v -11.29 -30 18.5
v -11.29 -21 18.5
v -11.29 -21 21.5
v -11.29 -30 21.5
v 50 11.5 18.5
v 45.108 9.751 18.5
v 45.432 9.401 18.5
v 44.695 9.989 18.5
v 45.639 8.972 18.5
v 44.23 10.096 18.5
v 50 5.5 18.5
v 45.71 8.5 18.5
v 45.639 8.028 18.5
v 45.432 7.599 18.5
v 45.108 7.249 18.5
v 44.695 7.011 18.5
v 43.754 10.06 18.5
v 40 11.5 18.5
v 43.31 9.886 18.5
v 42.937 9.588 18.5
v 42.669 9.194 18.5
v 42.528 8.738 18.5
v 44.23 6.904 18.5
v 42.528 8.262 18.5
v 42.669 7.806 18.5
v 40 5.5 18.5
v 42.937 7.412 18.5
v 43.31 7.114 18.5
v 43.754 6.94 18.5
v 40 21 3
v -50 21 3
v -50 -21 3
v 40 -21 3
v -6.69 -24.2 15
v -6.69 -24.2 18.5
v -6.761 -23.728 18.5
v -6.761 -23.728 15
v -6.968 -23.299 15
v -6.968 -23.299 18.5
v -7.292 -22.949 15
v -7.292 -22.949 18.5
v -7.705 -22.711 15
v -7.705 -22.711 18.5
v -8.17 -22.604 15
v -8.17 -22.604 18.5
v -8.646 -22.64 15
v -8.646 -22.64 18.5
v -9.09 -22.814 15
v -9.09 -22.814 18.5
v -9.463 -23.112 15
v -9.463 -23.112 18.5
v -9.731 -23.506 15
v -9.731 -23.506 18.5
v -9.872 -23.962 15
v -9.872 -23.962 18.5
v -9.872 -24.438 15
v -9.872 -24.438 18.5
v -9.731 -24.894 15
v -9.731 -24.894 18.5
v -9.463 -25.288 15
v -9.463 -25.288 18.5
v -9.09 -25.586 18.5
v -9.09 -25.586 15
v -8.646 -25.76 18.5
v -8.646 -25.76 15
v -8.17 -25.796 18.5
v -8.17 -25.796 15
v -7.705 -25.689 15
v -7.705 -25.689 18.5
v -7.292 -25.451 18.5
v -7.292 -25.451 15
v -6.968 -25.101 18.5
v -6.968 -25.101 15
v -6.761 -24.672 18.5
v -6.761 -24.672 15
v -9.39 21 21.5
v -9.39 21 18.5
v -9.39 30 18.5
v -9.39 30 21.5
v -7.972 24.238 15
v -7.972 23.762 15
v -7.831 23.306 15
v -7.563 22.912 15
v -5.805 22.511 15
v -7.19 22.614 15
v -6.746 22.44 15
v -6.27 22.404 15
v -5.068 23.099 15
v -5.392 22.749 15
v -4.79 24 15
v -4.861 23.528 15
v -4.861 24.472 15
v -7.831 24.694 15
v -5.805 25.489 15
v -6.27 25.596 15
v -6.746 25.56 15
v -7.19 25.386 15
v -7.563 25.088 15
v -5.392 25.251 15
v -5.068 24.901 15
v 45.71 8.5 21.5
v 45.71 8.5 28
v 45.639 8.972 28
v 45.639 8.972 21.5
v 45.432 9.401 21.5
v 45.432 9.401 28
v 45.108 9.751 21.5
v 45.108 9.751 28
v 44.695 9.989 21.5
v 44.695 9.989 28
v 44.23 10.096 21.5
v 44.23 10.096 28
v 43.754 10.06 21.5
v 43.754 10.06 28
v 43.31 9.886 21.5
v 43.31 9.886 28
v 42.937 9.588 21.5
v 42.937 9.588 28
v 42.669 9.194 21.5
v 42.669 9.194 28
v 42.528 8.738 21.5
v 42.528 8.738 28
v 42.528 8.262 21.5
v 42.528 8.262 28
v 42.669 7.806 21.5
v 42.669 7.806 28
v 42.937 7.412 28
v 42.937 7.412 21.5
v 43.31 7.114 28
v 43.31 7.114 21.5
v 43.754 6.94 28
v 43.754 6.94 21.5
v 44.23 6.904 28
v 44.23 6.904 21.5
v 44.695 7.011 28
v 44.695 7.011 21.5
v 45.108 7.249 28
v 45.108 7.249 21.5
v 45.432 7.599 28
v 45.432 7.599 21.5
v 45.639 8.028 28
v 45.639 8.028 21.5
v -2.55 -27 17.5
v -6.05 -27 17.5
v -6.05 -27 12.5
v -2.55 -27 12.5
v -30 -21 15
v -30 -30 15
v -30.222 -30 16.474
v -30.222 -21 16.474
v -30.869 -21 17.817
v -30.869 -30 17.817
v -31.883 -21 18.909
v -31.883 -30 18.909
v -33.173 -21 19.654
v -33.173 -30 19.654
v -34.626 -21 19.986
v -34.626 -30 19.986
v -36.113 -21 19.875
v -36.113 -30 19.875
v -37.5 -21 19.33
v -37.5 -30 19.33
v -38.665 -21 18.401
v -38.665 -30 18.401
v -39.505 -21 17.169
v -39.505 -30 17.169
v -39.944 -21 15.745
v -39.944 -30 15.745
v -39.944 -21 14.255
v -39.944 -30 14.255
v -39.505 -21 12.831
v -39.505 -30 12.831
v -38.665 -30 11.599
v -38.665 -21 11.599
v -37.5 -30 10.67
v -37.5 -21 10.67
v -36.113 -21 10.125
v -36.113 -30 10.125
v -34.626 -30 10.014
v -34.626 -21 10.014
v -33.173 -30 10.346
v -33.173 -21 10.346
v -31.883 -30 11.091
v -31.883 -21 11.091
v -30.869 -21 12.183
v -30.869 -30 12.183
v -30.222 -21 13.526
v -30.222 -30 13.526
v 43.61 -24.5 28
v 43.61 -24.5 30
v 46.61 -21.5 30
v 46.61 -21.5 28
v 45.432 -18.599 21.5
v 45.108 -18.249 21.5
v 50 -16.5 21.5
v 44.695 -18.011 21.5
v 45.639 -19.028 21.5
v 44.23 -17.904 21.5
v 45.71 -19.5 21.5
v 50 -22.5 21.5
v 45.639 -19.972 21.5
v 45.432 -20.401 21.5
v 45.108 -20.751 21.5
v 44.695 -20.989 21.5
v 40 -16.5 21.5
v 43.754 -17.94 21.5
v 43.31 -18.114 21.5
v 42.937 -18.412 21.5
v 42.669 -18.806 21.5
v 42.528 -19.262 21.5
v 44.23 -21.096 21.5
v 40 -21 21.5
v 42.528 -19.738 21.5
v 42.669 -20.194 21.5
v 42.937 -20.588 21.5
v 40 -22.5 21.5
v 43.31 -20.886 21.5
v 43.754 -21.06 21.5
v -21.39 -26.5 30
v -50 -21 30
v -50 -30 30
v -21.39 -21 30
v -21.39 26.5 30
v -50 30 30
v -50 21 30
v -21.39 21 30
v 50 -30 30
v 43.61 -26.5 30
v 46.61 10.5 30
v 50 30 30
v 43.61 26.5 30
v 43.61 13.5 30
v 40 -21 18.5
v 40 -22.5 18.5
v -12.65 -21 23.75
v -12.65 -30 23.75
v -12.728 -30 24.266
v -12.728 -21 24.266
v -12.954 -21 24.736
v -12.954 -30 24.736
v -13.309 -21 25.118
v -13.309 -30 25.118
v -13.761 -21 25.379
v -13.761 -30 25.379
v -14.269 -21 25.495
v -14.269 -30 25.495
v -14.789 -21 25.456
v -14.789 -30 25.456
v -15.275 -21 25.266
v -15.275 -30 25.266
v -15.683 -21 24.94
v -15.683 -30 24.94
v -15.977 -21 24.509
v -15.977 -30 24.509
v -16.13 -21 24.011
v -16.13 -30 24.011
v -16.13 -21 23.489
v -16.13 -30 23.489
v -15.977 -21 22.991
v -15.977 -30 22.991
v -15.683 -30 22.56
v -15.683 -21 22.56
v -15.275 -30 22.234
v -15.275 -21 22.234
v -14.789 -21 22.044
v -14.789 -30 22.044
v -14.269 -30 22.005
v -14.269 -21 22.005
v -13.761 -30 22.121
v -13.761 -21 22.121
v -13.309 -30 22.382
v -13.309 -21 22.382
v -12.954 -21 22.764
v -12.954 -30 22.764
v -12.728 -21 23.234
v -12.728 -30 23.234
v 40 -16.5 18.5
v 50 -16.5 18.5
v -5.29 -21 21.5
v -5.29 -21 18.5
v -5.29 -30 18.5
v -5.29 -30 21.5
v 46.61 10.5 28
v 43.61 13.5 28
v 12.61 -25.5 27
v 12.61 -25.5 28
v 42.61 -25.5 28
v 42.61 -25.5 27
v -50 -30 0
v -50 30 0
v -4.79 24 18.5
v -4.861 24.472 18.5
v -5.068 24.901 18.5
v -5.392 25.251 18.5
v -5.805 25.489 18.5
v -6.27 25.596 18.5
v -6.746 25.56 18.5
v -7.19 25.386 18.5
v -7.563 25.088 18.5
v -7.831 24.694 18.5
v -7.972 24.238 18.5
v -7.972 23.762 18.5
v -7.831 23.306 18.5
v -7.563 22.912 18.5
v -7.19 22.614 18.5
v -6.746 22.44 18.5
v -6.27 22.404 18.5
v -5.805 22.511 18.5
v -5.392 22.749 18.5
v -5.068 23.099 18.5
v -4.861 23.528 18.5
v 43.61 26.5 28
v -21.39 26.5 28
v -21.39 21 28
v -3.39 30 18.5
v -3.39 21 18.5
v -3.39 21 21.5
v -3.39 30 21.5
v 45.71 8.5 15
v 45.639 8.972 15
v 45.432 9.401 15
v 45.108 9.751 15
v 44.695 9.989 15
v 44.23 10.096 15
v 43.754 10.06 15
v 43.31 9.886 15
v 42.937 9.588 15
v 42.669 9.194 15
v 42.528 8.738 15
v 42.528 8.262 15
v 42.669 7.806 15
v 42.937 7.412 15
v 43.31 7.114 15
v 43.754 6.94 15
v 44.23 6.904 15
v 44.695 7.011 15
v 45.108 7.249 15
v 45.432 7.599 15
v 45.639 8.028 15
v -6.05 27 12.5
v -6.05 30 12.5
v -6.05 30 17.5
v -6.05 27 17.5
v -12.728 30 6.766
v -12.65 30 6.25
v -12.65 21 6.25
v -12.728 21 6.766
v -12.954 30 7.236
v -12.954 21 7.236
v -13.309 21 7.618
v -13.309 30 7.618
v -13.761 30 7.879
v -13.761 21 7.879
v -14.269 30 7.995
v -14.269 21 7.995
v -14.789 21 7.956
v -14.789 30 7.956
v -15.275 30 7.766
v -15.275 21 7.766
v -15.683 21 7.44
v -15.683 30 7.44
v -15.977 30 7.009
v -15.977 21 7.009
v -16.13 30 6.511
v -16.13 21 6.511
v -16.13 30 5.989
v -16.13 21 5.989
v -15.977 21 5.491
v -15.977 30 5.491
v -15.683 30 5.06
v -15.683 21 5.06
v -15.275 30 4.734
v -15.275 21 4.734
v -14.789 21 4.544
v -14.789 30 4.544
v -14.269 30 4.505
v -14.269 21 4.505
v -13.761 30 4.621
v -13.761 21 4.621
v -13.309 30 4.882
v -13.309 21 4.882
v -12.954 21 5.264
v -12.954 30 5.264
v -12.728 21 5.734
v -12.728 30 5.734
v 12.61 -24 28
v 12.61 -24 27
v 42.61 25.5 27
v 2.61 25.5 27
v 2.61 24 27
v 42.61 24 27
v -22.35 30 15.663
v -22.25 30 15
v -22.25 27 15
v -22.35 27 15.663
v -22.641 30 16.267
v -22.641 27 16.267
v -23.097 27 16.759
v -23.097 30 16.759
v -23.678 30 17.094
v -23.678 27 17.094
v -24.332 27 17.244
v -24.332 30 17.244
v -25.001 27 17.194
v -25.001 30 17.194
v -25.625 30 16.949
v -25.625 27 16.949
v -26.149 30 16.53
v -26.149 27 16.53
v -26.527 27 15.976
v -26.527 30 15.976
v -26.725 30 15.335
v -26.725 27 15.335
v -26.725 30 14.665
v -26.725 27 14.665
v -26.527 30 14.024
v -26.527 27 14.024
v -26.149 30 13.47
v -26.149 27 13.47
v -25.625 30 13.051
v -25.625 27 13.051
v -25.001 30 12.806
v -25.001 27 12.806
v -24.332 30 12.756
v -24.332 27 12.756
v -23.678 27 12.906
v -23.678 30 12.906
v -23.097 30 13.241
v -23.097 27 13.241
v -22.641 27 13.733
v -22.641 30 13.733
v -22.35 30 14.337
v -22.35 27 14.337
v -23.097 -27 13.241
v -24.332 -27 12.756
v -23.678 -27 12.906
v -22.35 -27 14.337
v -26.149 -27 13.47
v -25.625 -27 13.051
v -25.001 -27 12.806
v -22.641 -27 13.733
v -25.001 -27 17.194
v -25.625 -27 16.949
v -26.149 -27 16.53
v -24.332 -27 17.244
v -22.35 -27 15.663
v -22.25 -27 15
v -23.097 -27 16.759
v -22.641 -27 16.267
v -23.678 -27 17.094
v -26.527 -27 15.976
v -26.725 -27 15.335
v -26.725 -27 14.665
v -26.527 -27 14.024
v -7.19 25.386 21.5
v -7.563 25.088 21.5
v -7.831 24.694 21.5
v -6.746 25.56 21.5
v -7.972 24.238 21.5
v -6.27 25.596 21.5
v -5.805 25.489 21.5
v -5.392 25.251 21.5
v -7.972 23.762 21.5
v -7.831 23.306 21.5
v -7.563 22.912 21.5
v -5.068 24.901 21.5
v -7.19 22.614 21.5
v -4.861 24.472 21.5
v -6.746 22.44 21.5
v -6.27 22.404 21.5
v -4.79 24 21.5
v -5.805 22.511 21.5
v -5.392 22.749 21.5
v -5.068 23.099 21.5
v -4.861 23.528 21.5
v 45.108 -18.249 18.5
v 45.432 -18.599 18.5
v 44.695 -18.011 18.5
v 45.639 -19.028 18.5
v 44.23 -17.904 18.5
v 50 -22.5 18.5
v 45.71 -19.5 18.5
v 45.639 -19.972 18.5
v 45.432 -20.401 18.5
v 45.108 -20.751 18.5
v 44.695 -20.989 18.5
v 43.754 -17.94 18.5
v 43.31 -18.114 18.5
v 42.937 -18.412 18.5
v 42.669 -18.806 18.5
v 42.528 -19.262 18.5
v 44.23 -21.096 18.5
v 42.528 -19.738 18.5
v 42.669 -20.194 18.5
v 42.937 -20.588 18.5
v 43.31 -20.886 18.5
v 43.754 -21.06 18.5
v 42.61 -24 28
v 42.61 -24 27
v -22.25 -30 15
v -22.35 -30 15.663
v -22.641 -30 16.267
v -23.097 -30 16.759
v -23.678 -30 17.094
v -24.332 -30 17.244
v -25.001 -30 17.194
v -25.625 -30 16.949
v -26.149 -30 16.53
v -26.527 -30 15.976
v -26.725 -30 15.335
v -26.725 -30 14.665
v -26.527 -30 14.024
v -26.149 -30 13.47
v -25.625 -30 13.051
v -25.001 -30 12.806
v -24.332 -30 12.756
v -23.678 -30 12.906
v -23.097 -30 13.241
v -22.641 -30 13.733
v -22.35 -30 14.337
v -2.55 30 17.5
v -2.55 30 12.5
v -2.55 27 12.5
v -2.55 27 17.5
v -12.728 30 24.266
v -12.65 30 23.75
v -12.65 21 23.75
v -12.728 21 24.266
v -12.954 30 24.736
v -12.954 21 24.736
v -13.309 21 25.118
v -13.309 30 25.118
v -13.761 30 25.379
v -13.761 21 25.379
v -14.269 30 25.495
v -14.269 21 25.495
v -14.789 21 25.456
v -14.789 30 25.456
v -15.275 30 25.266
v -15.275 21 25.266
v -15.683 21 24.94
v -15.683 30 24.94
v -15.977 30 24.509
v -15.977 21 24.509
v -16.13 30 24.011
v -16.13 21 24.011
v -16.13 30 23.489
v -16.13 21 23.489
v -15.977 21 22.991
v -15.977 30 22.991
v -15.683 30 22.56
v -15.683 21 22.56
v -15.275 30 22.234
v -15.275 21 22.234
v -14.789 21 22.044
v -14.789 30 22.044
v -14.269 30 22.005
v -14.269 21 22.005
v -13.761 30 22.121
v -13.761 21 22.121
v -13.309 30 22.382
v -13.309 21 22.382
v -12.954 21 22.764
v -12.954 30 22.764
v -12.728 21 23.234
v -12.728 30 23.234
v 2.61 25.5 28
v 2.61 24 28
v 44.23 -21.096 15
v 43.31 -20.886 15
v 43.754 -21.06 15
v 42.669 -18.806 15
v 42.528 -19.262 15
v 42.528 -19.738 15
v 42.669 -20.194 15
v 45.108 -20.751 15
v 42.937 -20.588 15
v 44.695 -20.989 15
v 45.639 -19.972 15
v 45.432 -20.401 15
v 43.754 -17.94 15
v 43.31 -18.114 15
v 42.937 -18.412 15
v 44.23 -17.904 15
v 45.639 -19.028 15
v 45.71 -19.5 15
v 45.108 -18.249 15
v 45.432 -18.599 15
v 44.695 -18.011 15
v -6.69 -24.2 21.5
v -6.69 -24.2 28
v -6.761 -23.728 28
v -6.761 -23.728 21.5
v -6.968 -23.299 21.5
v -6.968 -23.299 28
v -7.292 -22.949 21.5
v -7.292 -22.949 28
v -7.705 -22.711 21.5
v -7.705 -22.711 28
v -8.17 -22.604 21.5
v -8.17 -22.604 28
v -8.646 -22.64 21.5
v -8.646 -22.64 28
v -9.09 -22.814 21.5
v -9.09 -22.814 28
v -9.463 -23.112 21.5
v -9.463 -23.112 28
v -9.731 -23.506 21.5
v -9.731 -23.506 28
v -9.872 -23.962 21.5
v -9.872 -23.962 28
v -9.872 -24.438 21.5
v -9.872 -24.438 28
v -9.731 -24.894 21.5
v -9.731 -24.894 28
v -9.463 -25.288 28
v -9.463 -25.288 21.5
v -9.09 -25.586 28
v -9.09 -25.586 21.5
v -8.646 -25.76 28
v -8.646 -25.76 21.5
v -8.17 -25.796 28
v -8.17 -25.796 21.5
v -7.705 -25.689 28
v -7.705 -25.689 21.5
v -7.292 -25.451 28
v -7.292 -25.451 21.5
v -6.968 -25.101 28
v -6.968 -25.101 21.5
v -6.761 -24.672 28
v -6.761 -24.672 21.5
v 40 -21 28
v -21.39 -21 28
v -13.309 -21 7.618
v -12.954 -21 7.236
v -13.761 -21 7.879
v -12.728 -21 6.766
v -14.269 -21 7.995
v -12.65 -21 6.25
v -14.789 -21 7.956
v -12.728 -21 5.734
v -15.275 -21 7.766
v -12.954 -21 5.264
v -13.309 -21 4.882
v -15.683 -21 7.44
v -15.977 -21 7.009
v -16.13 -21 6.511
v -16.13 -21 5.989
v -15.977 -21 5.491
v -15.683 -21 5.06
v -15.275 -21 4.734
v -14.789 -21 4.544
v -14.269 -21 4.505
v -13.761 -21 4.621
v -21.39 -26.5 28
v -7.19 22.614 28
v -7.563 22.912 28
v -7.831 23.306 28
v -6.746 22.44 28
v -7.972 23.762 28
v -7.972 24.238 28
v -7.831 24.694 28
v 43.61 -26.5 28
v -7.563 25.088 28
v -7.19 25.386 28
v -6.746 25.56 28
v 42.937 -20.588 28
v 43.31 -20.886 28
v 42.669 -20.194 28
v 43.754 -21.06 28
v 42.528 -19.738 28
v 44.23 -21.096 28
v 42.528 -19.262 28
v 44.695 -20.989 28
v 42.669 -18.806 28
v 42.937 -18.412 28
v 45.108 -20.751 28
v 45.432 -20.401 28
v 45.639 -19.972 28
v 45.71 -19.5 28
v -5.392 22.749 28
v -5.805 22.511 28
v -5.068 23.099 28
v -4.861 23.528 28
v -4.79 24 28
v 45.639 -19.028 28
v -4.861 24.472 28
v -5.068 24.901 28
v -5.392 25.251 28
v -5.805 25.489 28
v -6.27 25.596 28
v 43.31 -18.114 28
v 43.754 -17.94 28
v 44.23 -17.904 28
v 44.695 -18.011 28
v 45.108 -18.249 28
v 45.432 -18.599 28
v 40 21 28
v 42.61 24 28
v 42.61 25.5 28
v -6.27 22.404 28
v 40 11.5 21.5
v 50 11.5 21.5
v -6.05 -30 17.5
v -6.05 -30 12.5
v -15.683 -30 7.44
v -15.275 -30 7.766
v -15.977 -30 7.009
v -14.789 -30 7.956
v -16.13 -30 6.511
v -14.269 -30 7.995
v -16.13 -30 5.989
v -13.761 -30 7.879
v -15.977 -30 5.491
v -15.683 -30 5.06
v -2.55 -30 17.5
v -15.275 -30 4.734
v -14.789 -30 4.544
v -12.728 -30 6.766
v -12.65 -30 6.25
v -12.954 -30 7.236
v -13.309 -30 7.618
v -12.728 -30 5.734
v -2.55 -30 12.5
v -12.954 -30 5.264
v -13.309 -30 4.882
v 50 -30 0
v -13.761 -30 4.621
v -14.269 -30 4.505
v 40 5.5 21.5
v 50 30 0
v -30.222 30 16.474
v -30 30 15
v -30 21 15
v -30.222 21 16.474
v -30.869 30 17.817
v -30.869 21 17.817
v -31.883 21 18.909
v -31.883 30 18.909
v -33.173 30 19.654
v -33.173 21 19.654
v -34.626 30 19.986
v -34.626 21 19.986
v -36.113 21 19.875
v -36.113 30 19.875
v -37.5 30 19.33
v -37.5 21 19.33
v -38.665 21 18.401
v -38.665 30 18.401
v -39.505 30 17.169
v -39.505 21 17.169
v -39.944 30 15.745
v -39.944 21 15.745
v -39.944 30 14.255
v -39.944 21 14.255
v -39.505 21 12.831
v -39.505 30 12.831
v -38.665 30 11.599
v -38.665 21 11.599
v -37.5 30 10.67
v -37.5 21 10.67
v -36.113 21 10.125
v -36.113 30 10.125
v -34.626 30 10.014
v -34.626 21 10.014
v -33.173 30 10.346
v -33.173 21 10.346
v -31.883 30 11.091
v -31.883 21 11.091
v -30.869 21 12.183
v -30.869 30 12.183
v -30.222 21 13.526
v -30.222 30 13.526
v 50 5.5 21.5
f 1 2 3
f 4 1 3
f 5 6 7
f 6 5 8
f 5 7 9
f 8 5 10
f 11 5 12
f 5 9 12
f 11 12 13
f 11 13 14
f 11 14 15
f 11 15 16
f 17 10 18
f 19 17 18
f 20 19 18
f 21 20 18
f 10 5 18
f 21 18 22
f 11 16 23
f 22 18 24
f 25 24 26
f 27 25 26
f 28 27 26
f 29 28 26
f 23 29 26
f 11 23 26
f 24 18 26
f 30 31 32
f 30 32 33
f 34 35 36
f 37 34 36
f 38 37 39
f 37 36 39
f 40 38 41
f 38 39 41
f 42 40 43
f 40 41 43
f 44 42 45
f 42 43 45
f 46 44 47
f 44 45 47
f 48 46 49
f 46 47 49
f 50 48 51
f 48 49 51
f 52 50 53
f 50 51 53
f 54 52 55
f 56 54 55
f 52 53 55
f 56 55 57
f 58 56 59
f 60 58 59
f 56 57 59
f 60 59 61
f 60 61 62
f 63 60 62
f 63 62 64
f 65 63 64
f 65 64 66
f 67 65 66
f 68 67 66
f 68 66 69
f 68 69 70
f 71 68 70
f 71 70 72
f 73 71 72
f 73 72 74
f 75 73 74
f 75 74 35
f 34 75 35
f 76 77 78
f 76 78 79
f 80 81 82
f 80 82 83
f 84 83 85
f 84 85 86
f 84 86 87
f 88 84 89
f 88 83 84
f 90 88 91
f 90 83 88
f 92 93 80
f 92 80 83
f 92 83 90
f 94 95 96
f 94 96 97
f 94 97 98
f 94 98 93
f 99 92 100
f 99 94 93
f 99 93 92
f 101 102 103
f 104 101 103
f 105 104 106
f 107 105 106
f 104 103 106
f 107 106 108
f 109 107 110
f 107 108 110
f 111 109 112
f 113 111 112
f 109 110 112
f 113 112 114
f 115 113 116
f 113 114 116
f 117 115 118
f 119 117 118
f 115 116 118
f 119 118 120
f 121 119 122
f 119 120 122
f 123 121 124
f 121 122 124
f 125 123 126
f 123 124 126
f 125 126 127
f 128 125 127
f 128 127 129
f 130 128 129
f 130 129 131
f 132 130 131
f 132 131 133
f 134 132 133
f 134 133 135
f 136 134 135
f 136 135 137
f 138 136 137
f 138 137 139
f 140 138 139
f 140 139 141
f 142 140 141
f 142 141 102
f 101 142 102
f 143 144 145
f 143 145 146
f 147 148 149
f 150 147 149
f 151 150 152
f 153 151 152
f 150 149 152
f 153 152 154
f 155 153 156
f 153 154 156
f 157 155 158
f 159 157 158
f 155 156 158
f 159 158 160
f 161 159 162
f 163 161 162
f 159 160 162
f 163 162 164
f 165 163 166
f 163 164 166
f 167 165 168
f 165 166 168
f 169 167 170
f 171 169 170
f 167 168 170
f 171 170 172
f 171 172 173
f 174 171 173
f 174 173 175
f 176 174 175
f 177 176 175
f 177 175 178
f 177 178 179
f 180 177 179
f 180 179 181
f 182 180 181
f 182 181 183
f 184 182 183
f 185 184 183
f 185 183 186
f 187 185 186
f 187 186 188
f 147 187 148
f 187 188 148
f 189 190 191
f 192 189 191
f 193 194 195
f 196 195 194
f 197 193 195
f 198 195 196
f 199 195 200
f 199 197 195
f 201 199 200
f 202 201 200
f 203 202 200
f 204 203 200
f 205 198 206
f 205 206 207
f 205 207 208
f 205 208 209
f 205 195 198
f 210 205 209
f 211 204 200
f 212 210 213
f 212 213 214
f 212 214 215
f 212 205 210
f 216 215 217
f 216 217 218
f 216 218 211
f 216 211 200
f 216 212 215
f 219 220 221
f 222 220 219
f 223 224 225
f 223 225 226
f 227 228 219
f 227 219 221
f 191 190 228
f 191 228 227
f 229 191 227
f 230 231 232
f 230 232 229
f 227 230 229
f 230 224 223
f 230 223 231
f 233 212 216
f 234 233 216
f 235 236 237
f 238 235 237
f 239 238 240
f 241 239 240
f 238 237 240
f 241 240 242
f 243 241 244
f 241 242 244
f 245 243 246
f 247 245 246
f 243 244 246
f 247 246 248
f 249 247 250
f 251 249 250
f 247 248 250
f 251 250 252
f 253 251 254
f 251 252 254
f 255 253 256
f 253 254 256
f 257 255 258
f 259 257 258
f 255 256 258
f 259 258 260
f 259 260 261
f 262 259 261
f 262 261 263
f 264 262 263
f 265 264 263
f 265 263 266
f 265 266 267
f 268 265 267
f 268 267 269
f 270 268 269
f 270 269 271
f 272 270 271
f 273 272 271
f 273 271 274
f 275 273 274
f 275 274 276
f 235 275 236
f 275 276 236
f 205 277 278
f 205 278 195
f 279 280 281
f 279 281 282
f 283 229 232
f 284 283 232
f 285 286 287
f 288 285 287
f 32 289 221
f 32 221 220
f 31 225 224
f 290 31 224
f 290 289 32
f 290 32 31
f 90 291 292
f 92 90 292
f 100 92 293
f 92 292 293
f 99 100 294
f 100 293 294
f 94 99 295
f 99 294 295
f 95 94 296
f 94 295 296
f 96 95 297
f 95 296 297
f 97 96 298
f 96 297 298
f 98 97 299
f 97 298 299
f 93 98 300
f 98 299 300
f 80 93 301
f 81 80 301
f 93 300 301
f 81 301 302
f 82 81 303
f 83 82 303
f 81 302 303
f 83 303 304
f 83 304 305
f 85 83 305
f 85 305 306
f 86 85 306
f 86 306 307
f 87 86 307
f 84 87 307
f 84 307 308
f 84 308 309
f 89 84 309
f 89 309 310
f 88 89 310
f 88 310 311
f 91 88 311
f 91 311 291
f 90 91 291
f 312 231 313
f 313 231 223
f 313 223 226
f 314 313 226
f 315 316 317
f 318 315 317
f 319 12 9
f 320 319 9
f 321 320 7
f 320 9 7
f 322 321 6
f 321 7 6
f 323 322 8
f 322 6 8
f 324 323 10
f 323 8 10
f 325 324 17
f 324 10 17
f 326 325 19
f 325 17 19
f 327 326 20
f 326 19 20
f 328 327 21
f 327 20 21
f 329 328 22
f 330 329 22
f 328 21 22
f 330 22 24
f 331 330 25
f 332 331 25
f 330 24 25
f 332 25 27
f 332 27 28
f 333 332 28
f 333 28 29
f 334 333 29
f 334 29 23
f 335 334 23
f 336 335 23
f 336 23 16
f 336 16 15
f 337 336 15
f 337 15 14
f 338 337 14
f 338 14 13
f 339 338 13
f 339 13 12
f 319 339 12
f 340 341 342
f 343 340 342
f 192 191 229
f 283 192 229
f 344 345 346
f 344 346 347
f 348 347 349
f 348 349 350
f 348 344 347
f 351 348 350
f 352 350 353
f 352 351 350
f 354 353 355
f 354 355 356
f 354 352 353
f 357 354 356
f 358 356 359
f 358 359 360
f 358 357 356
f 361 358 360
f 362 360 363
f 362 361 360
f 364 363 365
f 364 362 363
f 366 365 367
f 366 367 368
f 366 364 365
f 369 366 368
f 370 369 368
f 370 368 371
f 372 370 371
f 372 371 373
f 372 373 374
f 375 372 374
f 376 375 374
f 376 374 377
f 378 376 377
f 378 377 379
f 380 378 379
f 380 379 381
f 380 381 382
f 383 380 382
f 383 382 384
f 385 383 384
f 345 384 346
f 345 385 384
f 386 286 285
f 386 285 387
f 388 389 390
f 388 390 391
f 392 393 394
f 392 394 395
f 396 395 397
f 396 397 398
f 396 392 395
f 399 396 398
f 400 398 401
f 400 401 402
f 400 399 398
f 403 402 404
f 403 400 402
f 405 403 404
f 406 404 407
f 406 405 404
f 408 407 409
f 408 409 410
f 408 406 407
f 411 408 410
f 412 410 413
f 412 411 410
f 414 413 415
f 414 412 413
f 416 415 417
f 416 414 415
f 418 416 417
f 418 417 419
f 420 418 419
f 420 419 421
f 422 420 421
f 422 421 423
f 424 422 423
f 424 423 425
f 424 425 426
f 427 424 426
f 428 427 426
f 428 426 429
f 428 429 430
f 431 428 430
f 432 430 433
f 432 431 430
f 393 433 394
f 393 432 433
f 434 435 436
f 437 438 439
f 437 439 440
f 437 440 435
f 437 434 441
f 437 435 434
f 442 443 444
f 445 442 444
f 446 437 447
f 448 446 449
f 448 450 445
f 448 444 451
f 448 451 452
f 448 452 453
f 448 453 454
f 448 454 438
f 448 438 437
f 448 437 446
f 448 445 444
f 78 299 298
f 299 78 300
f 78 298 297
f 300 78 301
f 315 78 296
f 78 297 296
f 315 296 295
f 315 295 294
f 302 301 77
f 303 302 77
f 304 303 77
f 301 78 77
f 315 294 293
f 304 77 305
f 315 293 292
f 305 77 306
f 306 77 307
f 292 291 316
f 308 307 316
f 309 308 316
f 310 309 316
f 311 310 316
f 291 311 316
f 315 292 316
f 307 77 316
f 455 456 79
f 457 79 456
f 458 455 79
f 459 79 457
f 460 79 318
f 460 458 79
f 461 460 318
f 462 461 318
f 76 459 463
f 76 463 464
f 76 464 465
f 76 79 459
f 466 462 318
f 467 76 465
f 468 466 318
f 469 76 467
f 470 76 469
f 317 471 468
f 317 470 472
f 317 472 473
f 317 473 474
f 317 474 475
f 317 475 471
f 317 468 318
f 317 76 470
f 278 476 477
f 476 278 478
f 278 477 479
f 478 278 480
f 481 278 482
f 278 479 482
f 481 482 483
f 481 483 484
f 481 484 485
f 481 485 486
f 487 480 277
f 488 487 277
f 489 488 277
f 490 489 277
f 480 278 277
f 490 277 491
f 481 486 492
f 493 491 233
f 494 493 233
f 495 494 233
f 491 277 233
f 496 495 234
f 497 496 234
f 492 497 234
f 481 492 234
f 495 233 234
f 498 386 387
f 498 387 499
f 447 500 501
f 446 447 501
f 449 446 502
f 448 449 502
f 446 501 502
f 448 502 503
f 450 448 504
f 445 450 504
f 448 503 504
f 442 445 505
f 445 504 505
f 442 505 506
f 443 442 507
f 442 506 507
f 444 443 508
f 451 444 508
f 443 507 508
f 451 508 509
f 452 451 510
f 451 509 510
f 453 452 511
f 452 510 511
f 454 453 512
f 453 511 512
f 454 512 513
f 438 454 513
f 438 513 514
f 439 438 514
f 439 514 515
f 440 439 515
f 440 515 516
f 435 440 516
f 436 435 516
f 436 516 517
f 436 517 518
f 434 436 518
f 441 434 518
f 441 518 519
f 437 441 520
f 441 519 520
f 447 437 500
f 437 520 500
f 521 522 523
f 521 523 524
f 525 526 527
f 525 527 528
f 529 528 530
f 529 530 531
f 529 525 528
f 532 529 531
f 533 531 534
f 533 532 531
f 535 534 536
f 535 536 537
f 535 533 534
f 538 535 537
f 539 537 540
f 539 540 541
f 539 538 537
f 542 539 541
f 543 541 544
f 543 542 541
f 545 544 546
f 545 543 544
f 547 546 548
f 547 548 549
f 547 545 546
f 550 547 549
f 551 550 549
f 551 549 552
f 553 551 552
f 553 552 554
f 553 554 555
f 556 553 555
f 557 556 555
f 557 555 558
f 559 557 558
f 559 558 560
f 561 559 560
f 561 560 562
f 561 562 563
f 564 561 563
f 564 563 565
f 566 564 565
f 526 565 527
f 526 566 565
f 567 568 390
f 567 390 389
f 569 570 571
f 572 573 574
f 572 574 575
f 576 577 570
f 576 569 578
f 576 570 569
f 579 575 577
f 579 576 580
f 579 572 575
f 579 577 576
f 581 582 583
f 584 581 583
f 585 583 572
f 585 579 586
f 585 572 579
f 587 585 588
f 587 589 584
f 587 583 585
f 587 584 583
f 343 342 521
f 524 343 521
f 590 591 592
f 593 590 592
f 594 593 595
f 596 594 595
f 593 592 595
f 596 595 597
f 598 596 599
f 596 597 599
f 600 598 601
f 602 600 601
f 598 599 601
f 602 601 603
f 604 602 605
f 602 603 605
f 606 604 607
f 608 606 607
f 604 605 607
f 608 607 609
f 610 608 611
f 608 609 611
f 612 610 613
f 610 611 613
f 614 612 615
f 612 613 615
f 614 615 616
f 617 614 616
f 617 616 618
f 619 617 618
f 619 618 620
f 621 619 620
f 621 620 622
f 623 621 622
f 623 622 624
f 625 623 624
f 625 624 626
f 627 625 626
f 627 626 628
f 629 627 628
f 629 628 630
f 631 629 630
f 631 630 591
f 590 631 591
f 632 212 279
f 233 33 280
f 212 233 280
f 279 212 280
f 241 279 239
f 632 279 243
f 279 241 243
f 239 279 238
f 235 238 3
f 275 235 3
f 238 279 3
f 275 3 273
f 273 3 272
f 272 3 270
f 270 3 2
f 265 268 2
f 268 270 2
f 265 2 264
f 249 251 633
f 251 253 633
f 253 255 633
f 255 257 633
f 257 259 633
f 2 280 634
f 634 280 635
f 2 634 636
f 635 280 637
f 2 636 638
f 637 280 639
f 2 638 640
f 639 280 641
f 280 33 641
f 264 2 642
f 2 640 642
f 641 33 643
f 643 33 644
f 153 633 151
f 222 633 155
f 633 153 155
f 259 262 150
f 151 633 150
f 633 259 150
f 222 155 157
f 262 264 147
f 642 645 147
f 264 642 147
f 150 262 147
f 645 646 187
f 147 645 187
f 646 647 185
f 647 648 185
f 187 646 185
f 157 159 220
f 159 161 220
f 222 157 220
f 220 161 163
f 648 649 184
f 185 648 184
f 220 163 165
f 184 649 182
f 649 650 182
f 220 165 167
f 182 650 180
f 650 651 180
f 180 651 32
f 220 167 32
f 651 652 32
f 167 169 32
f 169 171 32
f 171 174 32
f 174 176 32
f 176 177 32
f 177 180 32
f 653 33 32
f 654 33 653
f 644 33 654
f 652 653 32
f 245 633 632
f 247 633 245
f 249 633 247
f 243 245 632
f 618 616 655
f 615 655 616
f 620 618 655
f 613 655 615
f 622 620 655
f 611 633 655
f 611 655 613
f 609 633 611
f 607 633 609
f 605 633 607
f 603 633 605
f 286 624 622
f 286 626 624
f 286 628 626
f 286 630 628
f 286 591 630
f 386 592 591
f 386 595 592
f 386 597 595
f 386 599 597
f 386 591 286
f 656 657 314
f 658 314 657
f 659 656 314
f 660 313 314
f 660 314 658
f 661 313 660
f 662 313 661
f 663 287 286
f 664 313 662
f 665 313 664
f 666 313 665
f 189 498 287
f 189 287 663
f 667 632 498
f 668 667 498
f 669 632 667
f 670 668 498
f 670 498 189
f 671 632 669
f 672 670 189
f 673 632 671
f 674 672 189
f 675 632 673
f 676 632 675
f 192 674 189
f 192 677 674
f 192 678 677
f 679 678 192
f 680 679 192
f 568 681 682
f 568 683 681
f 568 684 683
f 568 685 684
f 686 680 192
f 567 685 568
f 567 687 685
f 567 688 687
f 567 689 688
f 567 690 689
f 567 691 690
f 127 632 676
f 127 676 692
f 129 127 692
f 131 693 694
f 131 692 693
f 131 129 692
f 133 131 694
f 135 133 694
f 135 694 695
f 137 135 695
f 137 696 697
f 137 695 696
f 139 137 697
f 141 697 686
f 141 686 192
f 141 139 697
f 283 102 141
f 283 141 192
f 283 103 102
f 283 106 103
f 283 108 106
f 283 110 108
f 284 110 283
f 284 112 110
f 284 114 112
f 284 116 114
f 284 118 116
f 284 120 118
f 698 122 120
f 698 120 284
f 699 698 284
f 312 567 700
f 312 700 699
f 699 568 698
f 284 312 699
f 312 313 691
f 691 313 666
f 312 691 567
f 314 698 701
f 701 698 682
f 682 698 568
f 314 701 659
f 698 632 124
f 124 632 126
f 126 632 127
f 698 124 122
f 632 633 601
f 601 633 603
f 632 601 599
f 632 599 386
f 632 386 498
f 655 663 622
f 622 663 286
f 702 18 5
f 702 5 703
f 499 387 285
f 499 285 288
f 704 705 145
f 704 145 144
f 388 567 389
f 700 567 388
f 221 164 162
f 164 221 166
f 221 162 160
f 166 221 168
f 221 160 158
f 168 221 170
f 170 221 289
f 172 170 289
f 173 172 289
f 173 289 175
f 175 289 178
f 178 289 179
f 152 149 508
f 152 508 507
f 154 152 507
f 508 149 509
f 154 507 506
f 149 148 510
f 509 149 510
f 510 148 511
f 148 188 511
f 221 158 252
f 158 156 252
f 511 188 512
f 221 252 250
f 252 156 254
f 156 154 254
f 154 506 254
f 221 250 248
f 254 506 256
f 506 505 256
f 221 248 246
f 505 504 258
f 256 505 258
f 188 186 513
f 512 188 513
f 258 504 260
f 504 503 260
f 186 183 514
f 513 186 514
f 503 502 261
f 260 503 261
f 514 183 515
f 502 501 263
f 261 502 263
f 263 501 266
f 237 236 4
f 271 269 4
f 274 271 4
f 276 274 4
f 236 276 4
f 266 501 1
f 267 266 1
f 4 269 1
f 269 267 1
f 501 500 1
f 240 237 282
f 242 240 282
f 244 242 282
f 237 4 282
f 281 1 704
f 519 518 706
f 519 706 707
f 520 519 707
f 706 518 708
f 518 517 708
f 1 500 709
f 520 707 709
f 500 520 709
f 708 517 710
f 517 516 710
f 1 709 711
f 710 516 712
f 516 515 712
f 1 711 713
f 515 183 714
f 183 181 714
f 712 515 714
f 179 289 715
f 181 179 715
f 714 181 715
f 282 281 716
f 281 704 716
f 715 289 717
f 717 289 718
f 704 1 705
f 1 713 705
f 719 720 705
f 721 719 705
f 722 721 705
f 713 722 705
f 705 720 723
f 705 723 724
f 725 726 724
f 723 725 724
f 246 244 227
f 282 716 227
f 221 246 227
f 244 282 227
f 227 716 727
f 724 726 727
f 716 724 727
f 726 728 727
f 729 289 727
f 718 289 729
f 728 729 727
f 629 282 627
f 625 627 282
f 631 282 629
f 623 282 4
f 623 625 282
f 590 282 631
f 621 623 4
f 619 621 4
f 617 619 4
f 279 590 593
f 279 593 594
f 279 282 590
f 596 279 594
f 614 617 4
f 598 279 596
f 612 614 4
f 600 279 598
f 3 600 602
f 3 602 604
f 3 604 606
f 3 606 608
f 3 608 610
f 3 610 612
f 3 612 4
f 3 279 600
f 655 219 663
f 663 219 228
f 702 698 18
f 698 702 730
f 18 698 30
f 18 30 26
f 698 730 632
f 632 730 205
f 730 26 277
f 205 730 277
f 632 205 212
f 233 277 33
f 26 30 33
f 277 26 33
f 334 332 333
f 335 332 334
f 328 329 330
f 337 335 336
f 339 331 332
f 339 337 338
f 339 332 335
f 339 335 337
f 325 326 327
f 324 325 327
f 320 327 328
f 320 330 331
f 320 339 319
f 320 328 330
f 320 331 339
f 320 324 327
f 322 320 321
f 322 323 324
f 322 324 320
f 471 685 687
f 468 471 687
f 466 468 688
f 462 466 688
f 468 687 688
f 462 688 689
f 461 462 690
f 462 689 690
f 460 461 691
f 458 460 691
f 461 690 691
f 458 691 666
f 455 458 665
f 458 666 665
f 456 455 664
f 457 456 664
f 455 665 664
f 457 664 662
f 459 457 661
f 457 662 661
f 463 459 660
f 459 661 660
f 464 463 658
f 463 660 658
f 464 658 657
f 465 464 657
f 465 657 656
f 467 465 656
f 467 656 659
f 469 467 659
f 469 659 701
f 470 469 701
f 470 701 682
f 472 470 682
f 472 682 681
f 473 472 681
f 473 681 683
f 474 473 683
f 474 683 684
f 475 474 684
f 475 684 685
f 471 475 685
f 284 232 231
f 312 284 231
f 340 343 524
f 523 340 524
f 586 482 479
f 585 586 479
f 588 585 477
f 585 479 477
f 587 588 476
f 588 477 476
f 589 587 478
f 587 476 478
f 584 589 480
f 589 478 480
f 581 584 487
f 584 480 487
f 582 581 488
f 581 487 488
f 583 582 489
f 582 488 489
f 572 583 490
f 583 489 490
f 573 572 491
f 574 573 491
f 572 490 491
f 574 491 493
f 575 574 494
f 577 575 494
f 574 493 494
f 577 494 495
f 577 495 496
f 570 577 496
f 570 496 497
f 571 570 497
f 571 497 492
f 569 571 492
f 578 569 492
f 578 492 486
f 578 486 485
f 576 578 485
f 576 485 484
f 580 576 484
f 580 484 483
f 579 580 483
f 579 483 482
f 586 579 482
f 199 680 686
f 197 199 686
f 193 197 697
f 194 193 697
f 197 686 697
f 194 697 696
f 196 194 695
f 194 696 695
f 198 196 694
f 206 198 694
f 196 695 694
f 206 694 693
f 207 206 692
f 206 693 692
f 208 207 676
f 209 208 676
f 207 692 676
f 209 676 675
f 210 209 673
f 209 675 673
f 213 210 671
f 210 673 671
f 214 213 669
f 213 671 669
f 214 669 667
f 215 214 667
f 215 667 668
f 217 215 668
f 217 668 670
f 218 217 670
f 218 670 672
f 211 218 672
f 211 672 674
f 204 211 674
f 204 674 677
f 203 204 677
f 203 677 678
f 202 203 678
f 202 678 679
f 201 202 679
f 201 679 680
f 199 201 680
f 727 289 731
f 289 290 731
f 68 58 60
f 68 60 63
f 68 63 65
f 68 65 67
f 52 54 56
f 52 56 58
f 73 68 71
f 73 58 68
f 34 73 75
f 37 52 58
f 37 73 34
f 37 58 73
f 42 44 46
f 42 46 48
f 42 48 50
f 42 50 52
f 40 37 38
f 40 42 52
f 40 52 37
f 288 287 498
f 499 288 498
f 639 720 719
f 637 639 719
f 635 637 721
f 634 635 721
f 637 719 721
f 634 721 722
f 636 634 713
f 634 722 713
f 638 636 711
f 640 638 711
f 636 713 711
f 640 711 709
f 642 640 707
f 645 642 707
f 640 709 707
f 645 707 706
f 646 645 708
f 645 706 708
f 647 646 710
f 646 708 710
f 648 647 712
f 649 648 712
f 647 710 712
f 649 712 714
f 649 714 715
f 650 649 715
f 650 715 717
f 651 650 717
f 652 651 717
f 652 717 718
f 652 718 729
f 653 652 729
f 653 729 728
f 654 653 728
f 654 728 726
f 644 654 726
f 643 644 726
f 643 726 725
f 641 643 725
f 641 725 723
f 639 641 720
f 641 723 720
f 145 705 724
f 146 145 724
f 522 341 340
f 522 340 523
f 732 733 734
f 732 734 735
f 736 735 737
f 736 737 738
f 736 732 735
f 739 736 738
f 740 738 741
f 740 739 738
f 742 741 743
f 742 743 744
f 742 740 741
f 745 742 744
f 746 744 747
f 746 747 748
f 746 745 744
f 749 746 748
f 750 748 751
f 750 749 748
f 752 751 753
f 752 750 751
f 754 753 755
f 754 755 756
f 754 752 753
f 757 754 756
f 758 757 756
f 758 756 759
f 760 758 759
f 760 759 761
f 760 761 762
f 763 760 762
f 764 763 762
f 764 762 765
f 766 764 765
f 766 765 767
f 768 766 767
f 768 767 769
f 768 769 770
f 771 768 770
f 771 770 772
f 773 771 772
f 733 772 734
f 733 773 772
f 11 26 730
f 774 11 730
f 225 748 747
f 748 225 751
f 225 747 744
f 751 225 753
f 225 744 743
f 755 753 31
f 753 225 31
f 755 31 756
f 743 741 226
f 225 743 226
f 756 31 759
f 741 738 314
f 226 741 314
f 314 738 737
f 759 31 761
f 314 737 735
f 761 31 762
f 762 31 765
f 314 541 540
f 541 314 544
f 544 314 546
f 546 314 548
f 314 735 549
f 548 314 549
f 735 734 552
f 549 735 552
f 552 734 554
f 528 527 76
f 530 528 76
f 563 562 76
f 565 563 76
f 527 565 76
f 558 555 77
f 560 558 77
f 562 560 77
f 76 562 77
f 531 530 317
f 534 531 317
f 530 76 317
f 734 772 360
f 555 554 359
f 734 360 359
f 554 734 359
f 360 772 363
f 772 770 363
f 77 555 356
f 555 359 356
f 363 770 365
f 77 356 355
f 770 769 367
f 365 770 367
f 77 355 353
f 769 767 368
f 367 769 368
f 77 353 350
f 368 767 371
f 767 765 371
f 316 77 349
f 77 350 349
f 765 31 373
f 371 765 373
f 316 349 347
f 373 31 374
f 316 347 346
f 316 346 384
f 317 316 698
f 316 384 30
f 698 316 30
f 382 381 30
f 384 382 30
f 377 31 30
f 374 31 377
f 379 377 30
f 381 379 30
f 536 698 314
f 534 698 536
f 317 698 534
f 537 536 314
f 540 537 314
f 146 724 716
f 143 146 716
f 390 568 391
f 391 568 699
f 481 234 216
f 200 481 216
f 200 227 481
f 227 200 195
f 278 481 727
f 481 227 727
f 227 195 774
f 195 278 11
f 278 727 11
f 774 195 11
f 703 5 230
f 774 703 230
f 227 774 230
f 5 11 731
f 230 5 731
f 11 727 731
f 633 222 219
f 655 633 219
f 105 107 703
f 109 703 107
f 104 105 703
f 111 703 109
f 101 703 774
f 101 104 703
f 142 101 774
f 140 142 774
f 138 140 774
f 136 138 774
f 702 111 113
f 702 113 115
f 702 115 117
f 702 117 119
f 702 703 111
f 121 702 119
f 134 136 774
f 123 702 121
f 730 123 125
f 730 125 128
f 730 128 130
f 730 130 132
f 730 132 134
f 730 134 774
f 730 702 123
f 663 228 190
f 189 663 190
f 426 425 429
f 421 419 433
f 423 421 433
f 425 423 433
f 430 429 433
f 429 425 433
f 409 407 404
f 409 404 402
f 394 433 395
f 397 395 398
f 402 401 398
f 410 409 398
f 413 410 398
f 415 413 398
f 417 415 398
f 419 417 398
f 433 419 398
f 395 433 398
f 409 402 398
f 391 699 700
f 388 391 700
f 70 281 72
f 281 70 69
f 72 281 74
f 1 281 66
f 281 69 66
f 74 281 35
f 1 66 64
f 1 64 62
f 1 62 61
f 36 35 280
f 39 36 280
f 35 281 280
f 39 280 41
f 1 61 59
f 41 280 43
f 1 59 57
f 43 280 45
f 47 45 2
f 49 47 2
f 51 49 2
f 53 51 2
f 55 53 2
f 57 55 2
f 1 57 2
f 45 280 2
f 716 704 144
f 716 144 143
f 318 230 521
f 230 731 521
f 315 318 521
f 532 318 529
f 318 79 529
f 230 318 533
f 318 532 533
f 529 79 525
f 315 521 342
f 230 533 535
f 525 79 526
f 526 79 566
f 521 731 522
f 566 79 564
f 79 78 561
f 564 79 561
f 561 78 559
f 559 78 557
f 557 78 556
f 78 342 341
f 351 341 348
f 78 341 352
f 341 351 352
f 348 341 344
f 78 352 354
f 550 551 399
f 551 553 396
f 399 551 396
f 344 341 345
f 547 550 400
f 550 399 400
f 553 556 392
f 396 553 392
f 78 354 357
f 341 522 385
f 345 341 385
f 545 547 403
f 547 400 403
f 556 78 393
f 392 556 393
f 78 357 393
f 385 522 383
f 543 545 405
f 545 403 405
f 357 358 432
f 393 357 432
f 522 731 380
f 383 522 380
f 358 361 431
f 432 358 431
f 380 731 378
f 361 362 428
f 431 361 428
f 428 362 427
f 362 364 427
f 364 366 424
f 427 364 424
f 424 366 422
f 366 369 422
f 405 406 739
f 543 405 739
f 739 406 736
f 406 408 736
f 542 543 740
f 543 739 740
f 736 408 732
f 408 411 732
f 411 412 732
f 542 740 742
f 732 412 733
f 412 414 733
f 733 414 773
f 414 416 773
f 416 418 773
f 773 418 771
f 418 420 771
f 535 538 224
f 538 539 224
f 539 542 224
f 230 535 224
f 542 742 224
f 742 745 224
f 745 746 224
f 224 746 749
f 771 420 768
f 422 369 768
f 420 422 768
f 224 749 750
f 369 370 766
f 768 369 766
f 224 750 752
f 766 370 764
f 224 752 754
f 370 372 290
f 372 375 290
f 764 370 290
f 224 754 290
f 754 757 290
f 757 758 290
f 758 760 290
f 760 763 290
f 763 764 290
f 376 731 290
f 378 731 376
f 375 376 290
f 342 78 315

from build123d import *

# Parameters (mm, degrees)
F1_DEPTH  = 30
F0_W      = 90
F0_H      = 42
F2_DEPTH  = 3
F3_R      = 5
F3_R_2    = 1.75
F4_DEPTH  = 9
F3_R_3    = 2.25
F3_W      = 3.5
F3_H      = 5
F5_DEPTH  = 3
F7_W      = 40
F7_H      = 1.5
F7_W_2    = 30
F8_DEPTH  = 3
F7_R      = 1.6
F9_DEPTH  = 2
F10_DEPTH = 15
F11_W     = 6
F11_H     = 3
F12_DEPTH = 9
F13_W     = 6
F13_H     = 3
F14_DEPTH = 9
F15_W     = 6
F15_H     = 3
F16_DEPTH = 10


with BuildPart() as f1:
    # F0 (on Top) → F1 (new body)
    with BuildSketch(Plane.XY):
        Polygon((50, 30), (-50, 30), (-50, 21), (40, 21), (40, -21), (-50, -21), (-50, -30), (50, -30), align=None)
    extrude(amount=F1_DEPTH)

    # F0 (on Top) → F2 (join)
    with BuildSketch(Plane.XY):
        with Locations((-5, 0)):
            Rectangle(F0_W, F0_H)
    extrude(amount=F2_DEPTH)

    # F3 (on face) → F4 (cut, through all)
    with BuildSketch(Plane.XZ.offset(30)):
        with Locations((-35, 15)):
            Circle(F3_R)
        with Locations((-14.4, 23.75)):
            Circle(F3_R_2)
        with Locations((-14.4, 6.25)):
            Circle(F3_R_2)
    extrude(amount=-F4_DEPTH, mode=Mode.SUBTRACT)

    # F3 (on face) → F5 (cut)
    with BuildSketch(Plane.XZ.offset(30)):
        with Locations((-24.5, 15)):
            Circle(F3_R_3)
        with Locations((-4.3, 15)):
            Rectangle(F3_W, F3_H)
    extrude(amount=-F5_DEPTH, mode=Mode.SUBTRACT)

    # F6: F1 across plane


with BuildPart() as f1_1:
    add(f1.part)
    add(f1.part.mirror(Plane.XZ), mode=Mode.INTERSECT)

    # F7 (on face) → F8 (cut)
    with BuildSketch(Plane.XY.offset(30)):
        with Locations((22.6103741318, 24.75)):
            Rectangle(F7_W, F7_H)
        with Locations((27.6103741318, -24.75)):
            Rectangle(F7_W_2, F7_H)
    extrude(amount=-F8_DEPTH, mode=Mode.SUBTRACT)

    # F7 (on face) → F9 (cut)
    with BuildSketch(Plane.XY.offset(30)):
        Polygon((43.6103741318, 26.5), (-21.3896258682, 26.5), (-21.3896258682, -26.5), (43.6103741318, -26.5), (43.6103741318, -24.5), (46.6103741318, -21.5), (46.6103741318, 10.5), (43.6103741318, 13.5), align=None)
        with Locations((-8.2896258682, -24.2)):
            Circle(F7_R, mode=Mode.SUBTRACT)
        with Locations((27.6103741318, -24.75)):
            Rectangle(F7_W_2, F7_H, mode=Mode.SUBTRACT)
        with Locations((44.1103741318, -19.5)):
            Circle(F7_R, mode=Mode.SUBTRACT)
        with Locations((-6.3896258682, 24)):
            Circle(F7_R, mode=Mode.SUBTRACT)
        with Locations((44.1103741318, 8.5)):
            Circle(F7_R, mode=Mode.SUBTRACT)
        with Locations((22.6103741318, 24.75)):
            Rectangle(F7_W, F7_H, mode=Mode.SUBTRACT)
    extrude(amount=-F9_DEPTH, mode=Mode.SUBTRACT)

    # F10 (cut): faces of the model
    f10_faces = [f1_1.faces().sort_by_distance(p)[0] for p in [
        (-6.3896258682, 24, 30),
        (44.1103741318, 8.5, 30),
        (44.1103741318, -19.5, 30),
        (-8.2896258682, -24.2, 30),
    ]]
    extrude(f10_faces, amount=-F10_DEPTH, mode=Mode.SUBTRACT)

    # F11 (on face) → F12 (cut, through all)
    with BuildSketch(Plane.XZ.offset(-21)):
        with Locations((-6.3896258682, 20)):
            Rectangle(F11_W, F11_H)
    extrude(amount=-F12_DEPTH, mode=Mode.SUBTRACT)

    # F13 (on face) → F14 (cut, through all)
    with BuildSketch(Plane(origin=(0, -21, 0), x_dir=(-1, 0, 0), z_dir=(0, 1, 0))):
        with Locations((8.2896258682, 20)):
            Rectangle(F13_W, F13_H)
    extrude(amount=-F14_DEPTH, mode=Mode.SUBTRACT)

    # F15 (on face) → F16 (cut, through all)
    with BuildSketch(Plane(origin=(40, 0, 0), x_dir=(0, -1, 0), z_dir=(-1, 0, 0))):
        with Locations((-8.5, 20)):
            Rectangle(F15_W, F15_H)
        with Locations((19.5, 20)):
            Rectangle(F15_W, F15_H)
    extrude(amount=-F16_DEPTH, mode=Mode.SUBTRACT)


solid = f1_1.part
